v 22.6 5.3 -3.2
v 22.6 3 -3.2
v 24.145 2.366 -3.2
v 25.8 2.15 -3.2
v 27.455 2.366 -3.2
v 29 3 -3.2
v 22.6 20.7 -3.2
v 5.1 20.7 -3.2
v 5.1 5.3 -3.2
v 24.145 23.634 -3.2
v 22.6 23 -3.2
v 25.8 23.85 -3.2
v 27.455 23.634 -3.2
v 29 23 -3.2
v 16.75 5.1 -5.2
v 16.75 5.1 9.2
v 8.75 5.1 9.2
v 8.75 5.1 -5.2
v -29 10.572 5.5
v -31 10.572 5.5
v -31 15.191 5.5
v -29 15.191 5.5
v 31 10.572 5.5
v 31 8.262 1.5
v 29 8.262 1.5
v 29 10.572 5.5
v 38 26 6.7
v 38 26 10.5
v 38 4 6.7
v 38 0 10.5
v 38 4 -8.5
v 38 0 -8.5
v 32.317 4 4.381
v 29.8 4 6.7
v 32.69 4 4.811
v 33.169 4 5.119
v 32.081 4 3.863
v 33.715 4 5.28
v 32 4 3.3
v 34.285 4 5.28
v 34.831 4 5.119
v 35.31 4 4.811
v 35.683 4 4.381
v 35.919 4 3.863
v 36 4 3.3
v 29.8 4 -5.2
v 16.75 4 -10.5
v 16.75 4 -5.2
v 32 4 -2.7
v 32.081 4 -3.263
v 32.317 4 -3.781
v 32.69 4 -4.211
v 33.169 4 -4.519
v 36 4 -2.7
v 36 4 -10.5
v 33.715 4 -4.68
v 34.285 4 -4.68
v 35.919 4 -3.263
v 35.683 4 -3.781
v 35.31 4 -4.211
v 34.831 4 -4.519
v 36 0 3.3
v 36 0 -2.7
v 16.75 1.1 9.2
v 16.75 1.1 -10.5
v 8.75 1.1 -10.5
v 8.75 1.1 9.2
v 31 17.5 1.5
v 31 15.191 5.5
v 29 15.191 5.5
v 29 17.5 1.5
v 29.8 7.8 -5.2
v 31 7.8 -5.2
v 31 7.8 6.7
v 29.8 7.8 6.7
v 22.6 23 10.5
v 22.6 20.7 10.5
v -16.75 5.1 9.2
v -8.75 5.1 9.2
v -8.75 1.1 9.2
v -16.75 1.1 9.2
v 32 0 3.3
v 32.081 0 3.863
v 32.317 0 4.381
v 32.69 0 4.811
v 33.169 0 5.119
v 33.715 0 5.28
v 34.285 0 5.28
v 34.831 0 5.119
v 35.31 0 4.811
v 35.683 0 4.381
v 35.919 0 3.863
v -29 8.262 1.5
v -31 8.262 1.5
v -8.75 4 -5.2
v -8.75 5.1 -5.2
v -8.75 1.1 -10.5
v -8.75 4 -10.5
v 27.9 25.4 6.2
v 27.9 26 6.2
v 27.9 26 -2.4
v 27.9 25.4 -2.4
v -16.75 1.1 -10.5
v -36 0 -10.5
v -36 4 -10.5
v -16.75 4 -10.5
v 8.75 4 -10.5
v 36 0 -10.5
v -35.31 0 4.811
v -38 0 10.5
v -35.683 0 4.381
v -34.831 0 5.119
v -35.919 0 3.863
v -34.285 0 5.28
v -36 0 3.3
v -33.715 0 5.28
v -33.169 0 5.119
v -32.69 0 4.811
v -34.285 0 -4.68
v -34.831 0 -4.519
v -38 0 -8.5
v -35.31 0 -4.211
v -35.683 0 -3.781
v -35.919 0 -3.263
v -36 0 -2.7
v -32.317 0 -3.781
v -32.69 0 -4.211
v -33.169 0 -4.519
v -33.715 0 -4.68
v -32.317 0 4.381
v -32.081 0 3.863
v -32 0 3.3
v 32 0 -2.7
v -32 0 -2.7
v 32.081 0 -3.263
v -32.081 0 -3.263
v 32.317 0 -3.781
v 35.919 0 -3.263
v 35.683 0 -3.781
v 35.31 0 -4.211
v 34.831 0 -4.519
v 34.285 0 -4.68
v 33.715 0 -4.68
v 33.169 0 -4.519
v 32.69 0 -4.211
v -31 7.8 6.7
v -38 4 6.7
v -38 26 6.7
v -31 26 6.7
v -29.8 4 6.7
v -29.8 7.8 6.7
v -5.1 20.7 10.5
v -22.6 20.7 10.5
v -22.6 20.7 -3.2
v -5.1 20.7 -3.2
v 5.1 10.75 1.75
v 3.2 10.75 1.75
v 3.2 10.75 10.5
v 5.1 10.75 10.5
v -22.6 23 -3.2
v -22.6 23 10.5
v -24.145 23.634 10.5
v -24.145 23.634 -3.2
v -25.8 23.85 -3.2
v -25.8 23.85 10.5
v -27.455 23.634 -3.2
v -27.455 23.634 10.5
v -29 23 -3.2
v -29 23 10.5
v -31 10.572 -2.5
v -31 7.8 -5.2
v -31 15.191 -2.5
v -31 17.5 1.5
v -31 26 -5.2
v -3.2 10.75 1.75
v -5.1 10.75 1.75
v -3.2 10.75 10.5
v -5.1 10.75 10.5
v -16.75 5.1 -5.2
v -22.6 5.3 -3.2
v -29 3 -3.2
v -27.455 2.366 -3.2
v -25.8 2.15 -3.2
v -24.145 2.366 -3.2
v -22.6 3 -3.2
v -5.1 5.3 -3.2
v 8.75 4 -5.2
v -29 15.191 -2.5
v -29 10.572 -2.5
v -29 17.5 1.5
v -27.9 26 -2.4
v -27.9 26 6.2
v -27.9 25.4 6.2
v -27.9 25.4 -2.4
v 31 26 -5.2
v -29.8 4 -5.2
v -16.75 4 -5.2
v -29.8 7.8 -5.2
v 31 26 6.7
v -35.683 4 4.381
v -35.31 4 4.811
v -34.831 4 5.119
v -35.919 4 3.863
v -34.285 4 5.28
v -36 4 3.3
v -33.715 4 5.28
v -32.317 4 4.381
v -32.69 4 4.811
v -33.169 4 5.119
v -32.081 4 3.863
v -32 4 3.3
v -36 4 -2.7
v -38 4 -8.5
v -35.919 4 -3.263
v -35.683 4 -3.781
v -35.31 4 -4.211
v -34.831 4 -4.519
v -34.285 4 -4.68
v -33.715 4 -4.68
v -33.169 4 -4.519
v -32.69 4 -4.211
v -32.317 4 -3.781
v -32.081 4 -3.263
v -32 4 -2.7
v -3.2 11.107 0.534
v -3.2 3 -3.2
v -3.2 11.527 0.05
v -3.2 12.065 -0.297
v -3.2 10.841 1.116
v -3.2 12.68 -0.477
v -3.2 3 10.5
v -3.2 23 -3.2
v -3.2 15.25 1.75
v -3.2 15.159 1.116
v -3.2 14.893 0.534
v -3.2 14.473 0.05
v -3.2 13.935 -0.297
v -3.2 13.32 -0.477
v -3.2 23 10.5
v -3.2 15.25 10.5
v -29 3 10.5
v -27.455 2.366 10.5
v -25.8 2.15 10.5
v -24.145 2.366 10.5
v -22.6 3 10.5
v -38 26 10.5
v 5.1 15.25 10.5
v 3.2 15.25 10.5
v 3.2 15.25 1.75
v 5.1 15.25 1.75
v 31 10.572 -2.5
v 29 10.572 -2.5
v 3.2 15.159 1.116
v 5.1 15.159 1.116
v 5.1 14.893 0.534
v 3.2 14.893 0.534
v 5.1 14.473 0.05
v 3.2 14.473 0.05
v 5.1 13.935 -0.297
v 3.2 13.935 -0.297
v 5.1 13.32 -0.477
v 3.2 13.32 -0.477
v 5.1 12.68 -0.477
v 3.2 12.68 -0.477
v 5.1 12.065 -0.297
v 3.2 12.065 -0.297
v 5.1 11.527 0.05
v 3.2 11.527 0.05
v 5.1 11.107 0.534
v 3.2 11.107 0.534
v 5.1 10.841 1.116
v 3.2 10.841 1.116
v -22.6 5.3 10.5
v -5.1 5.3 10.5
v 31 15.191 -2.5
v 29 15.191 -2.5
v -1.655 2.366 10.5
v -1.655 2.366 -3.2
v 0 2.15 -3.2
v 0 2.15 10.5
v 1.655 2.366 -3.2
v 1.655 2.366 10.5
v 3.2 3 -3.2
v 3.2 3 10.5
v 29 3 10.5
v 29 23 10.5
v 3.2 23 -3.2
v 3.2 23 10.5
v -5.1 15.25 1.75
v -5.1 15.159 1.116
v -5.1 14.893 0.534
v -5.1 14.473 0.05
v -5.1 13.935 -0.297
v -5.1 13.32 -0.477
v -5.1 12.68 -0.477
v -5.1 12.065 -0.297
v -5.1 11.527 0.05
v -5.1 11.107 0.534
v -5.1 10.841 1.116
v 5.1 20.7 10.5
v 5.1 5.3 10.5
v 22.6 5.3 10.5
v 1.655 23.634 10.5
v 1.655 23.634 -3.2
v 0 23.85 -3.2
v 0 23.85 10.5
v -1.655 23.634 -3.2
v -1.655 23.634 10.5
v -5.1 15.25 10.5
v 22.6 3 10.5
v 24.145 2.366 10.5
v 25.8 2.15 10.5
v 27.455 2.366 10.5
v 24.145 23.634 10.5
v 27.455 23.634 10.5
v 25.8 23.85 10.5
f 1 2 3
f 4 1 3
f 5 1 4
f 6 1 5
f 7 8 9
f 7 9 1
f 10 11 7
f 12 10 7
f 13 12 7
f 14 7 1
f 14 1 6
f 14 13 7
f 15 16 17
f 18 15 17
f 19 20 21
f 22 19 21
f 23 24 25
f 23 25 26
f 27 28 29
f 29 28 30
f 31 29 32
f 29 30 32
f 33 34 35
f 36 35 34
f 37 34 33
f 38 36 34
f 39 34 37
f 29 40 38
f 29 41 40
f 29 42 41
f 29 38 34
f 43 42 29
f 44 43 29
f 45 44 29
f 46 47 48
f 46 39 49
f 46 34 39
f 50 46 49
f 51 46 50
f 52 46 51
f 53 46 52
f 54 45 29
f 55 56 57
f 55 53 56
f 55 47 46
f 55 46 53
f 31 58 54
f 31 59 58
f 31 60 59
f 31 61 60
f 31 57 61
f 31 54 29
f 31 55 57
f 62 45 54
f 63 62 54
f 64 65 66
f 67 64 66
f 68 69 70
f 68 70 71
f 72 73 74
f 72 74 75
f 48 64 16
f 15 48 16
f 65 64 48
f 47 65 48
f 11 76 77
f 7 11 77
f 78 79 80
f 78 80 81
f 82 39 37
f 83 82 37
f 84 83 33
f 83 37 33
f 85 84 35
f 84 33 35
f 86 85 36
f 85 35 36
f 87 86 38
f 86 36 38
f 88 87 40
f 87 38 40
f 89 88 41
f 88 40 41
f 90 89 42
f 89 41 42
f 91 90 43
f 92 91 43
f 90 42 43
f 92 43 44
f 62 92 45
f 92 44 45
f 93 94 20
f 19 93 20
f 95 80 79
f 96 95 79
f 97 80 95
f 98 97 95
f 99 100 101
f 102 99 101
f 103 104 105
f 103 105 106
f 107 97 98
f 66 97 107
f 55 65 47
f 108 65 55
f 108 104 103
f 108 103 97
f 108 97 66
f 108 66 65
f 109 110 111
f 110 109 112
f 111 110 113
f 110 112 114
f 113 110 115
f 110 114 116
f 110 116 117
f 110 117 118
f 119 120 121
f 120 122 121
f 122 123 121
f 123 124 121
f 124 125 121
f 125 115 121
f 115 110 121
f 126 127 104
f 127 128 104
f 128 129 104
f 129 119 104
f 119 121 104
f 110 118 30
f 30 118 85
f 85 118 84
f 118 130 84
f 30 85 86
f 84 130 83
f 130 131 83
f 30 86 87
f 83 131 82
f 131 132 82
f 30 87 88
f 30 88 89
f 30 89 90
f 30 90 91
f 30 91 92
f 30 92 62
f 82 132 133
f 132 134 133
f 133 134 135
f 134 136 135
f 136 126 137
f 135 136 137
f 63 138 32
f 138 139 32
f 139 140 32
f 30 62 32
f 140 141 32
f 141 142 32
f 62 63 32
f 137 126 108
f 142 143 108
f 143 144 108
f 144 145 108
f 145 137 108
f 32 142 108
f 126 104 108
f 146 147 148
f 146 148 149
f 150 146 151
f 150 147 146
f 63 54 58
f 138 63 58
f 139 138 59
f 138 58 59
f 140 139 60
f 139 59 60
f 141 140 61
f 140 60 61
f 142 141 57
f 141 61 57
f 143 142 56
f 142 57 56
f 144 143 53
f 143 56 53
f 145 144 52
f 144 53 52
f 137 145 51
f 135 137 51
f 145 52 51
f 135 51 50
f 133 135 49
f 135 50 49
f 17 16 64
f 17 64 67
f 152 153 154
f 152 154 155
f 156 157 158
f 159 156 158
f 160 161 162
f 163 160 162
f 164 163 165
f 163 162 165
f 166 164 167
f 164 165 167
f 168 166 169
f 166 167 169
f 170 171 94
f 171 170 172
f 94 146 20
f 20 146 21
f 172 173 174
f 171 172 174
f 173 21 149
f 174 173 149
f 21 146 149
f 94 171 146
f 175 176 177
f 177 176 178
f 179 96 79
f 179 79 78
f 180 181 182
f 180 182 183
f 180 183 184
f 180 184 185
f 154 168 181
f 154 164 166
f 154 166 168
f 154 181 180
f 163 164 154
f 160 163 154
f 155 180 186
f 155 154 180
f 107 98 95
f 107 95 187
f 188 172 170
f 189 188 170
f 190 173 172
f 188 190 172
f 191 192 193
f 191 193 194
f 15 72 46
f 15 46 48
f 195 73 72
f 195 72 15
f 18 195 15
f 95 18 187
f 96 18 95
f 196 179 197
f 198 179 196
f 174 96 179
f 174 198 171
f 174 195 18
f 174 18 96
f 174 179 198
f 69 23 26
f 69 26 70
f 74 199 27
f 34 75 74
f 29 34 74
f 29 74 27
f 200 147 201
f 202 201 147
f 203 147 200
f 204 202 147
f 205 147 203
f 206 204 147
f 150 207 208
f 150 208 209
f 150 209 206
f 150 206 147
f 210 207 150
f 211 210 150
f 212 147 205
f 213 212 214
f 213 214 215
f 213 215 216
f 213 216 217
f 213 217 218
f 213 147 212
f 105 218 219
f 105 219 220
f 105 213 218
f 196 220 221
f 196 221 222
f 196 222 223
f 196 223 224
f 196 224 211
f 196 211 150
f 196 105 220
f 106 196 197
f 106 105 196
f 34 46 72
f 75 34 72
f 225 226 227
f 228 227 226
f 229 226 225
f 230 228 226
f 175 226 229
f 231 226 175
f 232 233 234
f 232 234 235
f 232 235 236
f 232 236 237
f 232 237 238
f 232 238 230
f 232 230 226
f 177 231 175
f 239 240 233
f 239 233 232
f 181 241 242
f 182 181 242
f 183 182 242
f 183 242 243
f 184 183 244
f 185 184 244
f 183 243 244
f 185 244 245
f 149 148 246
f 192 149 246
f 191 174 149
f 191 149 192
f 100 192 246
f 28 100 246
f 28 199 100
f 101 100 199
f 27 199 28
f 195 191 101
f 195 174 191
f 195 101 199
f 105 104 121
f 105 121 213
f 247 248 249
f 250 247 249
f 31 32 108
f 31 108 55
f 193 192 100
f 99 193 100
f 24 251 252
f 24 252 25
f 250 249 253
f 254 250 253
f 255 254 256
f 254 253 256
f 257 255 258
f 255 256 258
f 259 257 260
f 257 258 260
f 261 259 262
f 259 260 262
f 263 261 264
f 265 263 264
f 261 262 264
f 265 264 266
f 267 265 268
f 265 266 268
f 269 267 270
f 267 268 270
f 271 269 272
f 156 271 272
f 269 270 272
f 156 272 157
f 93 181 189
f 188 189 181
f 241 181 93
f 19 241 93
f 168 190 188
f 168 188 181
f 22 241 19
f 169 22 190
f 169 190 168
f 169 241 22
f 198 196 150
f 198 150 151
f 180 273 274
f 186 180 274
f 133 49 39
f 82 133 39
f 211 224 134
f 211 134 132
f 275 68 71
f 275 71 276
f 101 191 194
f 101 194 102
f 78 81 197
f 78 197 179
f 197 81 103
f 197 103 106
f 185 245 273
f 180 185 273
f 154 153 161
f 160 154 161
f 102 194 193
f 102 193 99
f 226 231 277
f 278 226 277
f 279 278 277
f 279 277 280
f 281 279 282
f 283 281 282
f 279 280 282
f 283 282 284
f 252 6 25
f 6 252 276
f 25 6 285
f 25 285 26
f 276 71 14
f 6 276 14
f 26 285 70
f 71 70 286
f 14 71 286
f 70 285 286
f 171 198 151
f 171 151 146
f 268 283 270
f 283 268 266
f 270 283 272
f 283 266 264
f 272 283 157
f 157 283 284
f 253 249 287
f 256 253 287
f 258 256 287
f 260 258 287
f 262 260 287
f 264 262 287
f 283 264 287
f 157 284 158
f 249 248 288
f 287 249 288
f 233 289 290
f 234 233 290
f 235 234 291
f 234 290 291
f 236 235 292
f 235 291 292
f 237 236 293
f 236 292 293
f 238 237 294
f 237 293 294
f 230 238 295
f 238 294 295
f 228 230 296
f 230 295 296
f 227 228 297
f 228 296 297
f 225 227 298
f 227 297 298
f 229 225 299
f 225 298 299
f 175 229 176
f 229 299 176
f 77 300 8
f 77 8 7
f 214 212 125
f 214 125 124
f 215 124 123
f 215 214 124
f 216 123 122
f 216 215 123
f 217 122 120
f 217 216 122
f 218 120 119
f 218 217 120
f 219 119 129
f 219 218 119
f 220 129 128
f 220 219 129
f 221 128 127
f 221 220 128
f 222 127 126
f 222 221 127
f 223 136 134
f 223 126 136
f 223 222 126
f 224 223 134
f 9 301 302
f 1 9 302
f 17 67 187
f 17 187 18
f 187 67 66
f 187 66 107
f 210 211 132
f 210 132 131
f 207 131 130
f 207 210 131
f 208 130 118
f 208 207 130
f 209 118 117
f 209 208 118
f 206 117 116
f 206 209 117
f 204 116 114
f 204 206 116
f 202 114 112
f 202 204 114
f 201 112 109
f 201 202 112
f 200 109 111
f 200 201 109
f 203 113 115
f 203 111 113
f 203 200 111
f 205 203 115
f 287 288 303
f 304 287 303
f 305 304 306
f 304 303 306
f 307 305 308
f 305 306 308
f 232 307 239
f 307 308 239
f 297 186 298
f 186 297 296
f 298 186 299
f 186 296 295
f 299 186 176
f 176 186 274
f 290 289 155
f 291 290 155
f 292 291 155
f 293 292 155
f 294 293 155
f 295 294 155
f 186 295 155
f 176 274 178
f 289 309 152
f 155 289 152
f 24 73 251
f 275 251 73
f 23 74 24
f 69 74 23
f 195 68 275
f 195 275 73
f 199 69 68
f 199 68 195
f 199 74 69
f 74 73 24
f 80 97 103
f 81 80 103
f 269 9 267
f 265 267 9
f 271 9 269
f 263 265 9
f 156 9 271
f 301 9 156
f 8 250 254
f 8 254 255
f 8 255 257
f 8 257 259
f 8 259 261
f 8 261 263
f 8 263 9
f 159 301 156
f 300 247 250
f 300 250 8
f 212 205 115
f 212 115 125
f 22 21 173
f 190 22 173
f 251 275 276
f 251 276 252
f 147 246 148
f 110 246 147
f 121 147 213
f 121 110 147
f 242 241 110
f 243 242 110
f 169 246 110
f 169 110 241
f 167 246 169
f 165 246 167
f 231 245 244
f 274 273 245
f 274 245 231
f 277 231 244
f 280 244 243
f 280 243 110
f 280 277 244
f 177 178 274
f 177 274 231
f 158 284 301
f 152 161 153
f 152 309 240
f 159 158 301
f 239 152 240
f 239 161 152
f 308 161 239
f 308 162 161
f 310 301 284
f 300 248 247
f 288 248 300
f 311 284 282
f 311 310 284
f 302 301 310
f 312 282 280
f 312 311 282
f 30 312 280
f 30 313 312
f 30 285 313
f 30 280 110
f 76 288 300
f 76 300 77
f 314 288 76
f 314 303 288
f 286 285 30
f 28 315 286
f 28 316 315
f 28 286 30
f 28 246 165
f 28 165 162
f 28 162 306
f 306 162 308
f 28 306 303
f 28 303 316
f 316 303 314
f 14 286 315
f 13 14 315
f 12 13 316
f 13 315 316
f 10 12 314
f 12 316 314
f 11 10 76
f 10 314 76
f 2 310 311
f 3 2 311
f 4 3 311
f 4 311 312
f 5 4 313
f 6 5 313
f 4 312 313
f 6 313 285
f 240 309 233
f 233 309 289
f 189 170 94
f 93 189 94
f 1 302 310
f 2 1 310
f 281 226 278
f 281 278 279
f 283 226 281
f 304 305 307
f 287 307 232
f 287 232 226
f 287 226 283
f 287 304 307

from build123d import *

# Parameters (mm, degrees)
SKETCH1_W           = 76
SKETCH1_H           = 21
BOSS_EXTRUDE1_DEPTH = 4
SKETCH2_W           = 76
SKETCH2_H           = 3.8
BOSS_EXTRUDE2_DEPTH = 26
SKETCH3_W           = 62
SKETCH3_H           = 22
BOSS_EXTRUDE3_DEPTH = 15.7
CHAMFER2_SIZE       = 2
SKETCH4_W           = 55.8
SKETCH4_H           = 8.6
CUT_EXTRUDE1_DEPTH  = 0.6
CUT_EXTRUDE2_DEPTH  = 46.14698218
SKETCH6_W           = 8
SKETCH6_H           = 4
CUT_EXTRUDE3_DEPTH  = 19.7
SKETCH7_W           = 58
SKETCH7_H           = 15.4
CUT_EXTRUDE4_DEPTH  = 13.7
CUT_EXTRUDE5_DEPTH  = 13.7
LPATTERN1_COUNT     = 3
LPATTERN1_PITCH     = 25.8
BOSS_EXTRUDE4_REACH = 52.606
SKETCH9_W           = 1.9
SKETCH9_H           = 15.4
CUT_EXTRUDE6_REACH  = 53.418
CUT_EXTRUDE7_REACH  = 76.48
SKETCH12_W          = 1.2
SKETCH12_H          = 3.8
CUT_EXTRUDE8_DEPTH  = 11.9


with BuildPart() as part:
    # Sketch1 → Boss-Extrude1 (new body)
    with BuildSketch(Plane(origin=(0, 0, 0), x_dir=(1, 0, 0), z_dir=(0, 1, 0))):
        Rectangle(SKETCH1_W, SKETCH1_H)
    extrude(amount=BOSS_EXTRUDE1_DEPTH)

    # Sketch2 → Boss-Extrude2 (add)
    with BuildSketch(Plane(origin=(0, 0, 0), x_dir=(1, 0, 0), z_dir=(0, 1, 0))):
        with Locations((0, -8.6)):
            Rectangle(SKETCH2_W, SKETCH2_H)
    extrude(amount=BOSS_EXTRUDE2_DEPTH)

    # Sketch3 → Boss-Extrude3 (add)
    with BuildSketch(Plane(origin=(0, 0, 10.5), x_dir=(-1, 0, 0), z_dir=(0, 0, -1))):
        with Locations((0, 15)):
            Rectangle(SKETCH3_W, SKETCH3_H)
    extrude(amount=BOSS_EXTRUDE3_DEPTH)

    # Chamfer2
    chamfer2_edges = [part.edges().sort_by_distance(p)[0] for p in [
        (-38, 2, -10.5),
        (38, 2, -10.5),
    ]]
    chamfer(chamfer2_edges, length=CHAMFER2_SIZE)

    # Sketch4 → Cut-Extrude1 (cut)
    with BuildSketch(Plane(origin=(0, 26, 0), x_dir=(1, 0, 0), z_dir=(0, 1, 0))):
        with Locations((0, -1.9)):
            Rectangle(SKETCH4_W, SKETCH4_H)
    extrude(amount=-CUT_EXTRUDE1_DEPTH, mode=Mode.SUBTRACT)

    # Sketch5 → Cut-Extrude2 (cut, through all)
    with BuildSketch(Plane(origin=(0, 4, 0), x_dir=(1, 0, 0), z_dir=(0, 1, 0))):
        with BuildLine():
            Line((-32, 2.7), (-32, -3.3))
            ThreePointArc((-32, -3.3), (-34, -5.3), (-36, -3.3))
            Line((-36, -3.3), (-36, 2.7))
            ThreePointArc((-36, 2.7), (-34, 4.7), (-32, 2.7))
        make_face()
        with BuildLine():
            Line((32, 2.7), (32, -3.3))
            ThreePointArc((32, -3.3), (34, -5.3), (36, -3.3))
            Line((36, -3.3), (36, 2.7))
            ThreePointArc((36, 2.7), (34, 4.7), (32, 2.7))
        make_face()
    extrude(amount=-CUT_EXTRUDE2_DEPTH, mode=Mode.SUBTRACT)

    # Sketch6 → Cut-Extrude3 (cut)
    with BuildSketch(Plane(origin=(0, 0, -10.5), x_dir=(-1, 0, 0), z_dir=(0, 0, -1))):
        with Locations((-12.75, 3.1)):
            Rectangle(SKETCH6_W, SKETCH6_H)
        with Locations((12.75, 3.1)):
            Rectangle(SKETCH6_W, SKETCH6_H)
    extrude(amount=-CUT_EXTRUDE3_DEPTH, mode=Mode.SUBTRACT)

    # Sketch7 → Cut-Extrude4 (cut)
    with BuildSketch(Plane.XY.offset(10.5)):
        with Locations((0, 13)):
            Rectangle(SKETCH7_W, SKETCH7_H)
    extrude(amount=-CUT_EXTRUDE4_DEPTH, mode=Mode.SUBTRACT)

    # Sketch8 → Cut-Extrude5 (cut)
    with BuildSketch(Plane.XY.offset(10.5)):
        with BuildLine():
            Line((-29, 23), (-29, 3))
            ThreePointArc((-29, 3), (-25.8, 2.15), (-22.6, 3))
            Line((-22.6, 3), (-22.6, 23))
            ThreePointArc((-22.6, 23), (-25.8, 23.85), (-29, 23))
        make_face()
    cut_extrude5 = extrude(amount=-CUT_EXTRUDE5_DEPTH, mode=Mode.SUBTRACT)

    # LPattern1: Cut-Extrude5 ×3
    with Locations(*[(i * LPATTERN1_PITCH, 0, 0) for i in range(1, LPATTERN1_COUNT)]):
        add(cut_extrude5, mode=Mode.SUBTRACT)

    # Sketch9 → Boss-Extrude4 (add, up to next)
    with BuildSketch(Plane.XY.offset(10.5), mode=Mode.PRIVATE) as boss_extrude4_sk1:
        with Locations((-4.15, 13)):
            Rectangle(SKETCH9_W, SKETCH9_H)
    boss_extrude4_tool1 = extrude(boss_extrude4_sk1.sketch, amount=-BOSS_EXTRUDE4_REACH, mode=Mode.PRIVATE) - part.part
    # Sketch9 → Boss-Extrude4 (add, up to next)
    with BuildSketch(Plane.XY.offset(10.5), mode=Mode.PRIVATE) as boss_extrude4_sk2:
        with Locations((4.15, 13)):
            Rectangle(SKETCH9_W, SKETCH9_H)
    boss_extrude4_tool2 = extrude(boss_extrude4_sk2.sketch, amount=-BOSS_EXTRUDE4_REACH, mode=Mode.PRIVATE) - part.part
    add(boss_extrude4_tool1.solids().sort_by_distance((-4.15, 13, 10.5))[0])
    add(boss_extrude4_tool2.solids().sort_by_distance((4.15, 13, 10.5))[0])

    # Cut-Extrude6: up to this face of the body (flat: up to its plane)
    cut_extrude6_end = Plane(part.part.faces().sort_by_distance((5.1, 13, 3.65))[0])
    # Sketch10 → Cut-Extrude6 (cut, up to the picked face)
    with BuildSketch(Plane.ZY.offset(5.1), mode=Mode.PRIVATE) as cut_extrude6_sk1:
        with BuildLine():
            Line((10.5, 15.25), (1.75, 15.25))
            ThreePointArc((1.75, 15.25), (-0.5, 13), (1.75, 10.75))
            Line((1.75, 10.75), (10.5, 10.75))
            Line((10.5, 10.75), (10.5, 15.25))
        make_face()
    cut_extrude6_tool1 = split(extrude(cut_extrude6_sk1.sketch, amount=-CUT_EXTRUDE6_REACH, mode=Mode.PRIVATE), bisect_by=cut_extrude6_end, keep=Keep.BOTH, mode=Mode.PRIVATE)
    add(cut_extrude6_tool1.solids().sort_by(Axis((-5.1, 13, 5.229437), (1, 0, 0)))[0], mode=Mode.SUBTRACT)

    # Sketch11 → Cut-Extrude7 (cut, up to next)
    with BuildSketch(Plane.ZY.offset(31), mode=Mode.PRIVATE) as cut_extrude7_sk1:
        Polygon((1.5, 17.5), (-2.5, 15.190598923), (-2.5, 10.57179677), (1.5, 8.262395693), (5.5, 10.57179677), (5.5, 15.190598923), align=None)
    cut_extrude7_tool1 = extrude(cut_extrude7_sk1.sketch, amount=-CUT_EXTRUDE7_REACH, mode=Mode.PRIVATE) & part.part
    cut_extrude7 = cut_extrude7_tool1.solids().sort_by_distance((-31, 12.881198, 1.5))[0]
    add(cut_extrude7, mode=Mode.SUBTRACT)

    # Mirror1: Cut-Extrude7 across plane
    add(cut_extrude7.mirror(Plane(origin=(0, 0, 0), x_dir=(0, 0, 1), z_dir=(1, 0, 0))), mode=Mode.SUBTRACT)

    # Sketch12 → Cut-Extrude8 (cut)
    with BuildSketch(Plane(origin=(0, 0, -5.2), x_dir=(-1, 0, 0), z_dir=(0, 0, -1))):
        with Locations((-30.4, 5.9)):
            Rectangle(SKETCH12_W, SKETCH12_H)
        with Locations((30.4, 5.9)):
            Rectangle(SKETCH12_W, SKETCH12_H)
    extrude(amount=-CUT_EXTRUDE8_DEPTH, mode=Mode.SUBTRACT)


solid = part.part
